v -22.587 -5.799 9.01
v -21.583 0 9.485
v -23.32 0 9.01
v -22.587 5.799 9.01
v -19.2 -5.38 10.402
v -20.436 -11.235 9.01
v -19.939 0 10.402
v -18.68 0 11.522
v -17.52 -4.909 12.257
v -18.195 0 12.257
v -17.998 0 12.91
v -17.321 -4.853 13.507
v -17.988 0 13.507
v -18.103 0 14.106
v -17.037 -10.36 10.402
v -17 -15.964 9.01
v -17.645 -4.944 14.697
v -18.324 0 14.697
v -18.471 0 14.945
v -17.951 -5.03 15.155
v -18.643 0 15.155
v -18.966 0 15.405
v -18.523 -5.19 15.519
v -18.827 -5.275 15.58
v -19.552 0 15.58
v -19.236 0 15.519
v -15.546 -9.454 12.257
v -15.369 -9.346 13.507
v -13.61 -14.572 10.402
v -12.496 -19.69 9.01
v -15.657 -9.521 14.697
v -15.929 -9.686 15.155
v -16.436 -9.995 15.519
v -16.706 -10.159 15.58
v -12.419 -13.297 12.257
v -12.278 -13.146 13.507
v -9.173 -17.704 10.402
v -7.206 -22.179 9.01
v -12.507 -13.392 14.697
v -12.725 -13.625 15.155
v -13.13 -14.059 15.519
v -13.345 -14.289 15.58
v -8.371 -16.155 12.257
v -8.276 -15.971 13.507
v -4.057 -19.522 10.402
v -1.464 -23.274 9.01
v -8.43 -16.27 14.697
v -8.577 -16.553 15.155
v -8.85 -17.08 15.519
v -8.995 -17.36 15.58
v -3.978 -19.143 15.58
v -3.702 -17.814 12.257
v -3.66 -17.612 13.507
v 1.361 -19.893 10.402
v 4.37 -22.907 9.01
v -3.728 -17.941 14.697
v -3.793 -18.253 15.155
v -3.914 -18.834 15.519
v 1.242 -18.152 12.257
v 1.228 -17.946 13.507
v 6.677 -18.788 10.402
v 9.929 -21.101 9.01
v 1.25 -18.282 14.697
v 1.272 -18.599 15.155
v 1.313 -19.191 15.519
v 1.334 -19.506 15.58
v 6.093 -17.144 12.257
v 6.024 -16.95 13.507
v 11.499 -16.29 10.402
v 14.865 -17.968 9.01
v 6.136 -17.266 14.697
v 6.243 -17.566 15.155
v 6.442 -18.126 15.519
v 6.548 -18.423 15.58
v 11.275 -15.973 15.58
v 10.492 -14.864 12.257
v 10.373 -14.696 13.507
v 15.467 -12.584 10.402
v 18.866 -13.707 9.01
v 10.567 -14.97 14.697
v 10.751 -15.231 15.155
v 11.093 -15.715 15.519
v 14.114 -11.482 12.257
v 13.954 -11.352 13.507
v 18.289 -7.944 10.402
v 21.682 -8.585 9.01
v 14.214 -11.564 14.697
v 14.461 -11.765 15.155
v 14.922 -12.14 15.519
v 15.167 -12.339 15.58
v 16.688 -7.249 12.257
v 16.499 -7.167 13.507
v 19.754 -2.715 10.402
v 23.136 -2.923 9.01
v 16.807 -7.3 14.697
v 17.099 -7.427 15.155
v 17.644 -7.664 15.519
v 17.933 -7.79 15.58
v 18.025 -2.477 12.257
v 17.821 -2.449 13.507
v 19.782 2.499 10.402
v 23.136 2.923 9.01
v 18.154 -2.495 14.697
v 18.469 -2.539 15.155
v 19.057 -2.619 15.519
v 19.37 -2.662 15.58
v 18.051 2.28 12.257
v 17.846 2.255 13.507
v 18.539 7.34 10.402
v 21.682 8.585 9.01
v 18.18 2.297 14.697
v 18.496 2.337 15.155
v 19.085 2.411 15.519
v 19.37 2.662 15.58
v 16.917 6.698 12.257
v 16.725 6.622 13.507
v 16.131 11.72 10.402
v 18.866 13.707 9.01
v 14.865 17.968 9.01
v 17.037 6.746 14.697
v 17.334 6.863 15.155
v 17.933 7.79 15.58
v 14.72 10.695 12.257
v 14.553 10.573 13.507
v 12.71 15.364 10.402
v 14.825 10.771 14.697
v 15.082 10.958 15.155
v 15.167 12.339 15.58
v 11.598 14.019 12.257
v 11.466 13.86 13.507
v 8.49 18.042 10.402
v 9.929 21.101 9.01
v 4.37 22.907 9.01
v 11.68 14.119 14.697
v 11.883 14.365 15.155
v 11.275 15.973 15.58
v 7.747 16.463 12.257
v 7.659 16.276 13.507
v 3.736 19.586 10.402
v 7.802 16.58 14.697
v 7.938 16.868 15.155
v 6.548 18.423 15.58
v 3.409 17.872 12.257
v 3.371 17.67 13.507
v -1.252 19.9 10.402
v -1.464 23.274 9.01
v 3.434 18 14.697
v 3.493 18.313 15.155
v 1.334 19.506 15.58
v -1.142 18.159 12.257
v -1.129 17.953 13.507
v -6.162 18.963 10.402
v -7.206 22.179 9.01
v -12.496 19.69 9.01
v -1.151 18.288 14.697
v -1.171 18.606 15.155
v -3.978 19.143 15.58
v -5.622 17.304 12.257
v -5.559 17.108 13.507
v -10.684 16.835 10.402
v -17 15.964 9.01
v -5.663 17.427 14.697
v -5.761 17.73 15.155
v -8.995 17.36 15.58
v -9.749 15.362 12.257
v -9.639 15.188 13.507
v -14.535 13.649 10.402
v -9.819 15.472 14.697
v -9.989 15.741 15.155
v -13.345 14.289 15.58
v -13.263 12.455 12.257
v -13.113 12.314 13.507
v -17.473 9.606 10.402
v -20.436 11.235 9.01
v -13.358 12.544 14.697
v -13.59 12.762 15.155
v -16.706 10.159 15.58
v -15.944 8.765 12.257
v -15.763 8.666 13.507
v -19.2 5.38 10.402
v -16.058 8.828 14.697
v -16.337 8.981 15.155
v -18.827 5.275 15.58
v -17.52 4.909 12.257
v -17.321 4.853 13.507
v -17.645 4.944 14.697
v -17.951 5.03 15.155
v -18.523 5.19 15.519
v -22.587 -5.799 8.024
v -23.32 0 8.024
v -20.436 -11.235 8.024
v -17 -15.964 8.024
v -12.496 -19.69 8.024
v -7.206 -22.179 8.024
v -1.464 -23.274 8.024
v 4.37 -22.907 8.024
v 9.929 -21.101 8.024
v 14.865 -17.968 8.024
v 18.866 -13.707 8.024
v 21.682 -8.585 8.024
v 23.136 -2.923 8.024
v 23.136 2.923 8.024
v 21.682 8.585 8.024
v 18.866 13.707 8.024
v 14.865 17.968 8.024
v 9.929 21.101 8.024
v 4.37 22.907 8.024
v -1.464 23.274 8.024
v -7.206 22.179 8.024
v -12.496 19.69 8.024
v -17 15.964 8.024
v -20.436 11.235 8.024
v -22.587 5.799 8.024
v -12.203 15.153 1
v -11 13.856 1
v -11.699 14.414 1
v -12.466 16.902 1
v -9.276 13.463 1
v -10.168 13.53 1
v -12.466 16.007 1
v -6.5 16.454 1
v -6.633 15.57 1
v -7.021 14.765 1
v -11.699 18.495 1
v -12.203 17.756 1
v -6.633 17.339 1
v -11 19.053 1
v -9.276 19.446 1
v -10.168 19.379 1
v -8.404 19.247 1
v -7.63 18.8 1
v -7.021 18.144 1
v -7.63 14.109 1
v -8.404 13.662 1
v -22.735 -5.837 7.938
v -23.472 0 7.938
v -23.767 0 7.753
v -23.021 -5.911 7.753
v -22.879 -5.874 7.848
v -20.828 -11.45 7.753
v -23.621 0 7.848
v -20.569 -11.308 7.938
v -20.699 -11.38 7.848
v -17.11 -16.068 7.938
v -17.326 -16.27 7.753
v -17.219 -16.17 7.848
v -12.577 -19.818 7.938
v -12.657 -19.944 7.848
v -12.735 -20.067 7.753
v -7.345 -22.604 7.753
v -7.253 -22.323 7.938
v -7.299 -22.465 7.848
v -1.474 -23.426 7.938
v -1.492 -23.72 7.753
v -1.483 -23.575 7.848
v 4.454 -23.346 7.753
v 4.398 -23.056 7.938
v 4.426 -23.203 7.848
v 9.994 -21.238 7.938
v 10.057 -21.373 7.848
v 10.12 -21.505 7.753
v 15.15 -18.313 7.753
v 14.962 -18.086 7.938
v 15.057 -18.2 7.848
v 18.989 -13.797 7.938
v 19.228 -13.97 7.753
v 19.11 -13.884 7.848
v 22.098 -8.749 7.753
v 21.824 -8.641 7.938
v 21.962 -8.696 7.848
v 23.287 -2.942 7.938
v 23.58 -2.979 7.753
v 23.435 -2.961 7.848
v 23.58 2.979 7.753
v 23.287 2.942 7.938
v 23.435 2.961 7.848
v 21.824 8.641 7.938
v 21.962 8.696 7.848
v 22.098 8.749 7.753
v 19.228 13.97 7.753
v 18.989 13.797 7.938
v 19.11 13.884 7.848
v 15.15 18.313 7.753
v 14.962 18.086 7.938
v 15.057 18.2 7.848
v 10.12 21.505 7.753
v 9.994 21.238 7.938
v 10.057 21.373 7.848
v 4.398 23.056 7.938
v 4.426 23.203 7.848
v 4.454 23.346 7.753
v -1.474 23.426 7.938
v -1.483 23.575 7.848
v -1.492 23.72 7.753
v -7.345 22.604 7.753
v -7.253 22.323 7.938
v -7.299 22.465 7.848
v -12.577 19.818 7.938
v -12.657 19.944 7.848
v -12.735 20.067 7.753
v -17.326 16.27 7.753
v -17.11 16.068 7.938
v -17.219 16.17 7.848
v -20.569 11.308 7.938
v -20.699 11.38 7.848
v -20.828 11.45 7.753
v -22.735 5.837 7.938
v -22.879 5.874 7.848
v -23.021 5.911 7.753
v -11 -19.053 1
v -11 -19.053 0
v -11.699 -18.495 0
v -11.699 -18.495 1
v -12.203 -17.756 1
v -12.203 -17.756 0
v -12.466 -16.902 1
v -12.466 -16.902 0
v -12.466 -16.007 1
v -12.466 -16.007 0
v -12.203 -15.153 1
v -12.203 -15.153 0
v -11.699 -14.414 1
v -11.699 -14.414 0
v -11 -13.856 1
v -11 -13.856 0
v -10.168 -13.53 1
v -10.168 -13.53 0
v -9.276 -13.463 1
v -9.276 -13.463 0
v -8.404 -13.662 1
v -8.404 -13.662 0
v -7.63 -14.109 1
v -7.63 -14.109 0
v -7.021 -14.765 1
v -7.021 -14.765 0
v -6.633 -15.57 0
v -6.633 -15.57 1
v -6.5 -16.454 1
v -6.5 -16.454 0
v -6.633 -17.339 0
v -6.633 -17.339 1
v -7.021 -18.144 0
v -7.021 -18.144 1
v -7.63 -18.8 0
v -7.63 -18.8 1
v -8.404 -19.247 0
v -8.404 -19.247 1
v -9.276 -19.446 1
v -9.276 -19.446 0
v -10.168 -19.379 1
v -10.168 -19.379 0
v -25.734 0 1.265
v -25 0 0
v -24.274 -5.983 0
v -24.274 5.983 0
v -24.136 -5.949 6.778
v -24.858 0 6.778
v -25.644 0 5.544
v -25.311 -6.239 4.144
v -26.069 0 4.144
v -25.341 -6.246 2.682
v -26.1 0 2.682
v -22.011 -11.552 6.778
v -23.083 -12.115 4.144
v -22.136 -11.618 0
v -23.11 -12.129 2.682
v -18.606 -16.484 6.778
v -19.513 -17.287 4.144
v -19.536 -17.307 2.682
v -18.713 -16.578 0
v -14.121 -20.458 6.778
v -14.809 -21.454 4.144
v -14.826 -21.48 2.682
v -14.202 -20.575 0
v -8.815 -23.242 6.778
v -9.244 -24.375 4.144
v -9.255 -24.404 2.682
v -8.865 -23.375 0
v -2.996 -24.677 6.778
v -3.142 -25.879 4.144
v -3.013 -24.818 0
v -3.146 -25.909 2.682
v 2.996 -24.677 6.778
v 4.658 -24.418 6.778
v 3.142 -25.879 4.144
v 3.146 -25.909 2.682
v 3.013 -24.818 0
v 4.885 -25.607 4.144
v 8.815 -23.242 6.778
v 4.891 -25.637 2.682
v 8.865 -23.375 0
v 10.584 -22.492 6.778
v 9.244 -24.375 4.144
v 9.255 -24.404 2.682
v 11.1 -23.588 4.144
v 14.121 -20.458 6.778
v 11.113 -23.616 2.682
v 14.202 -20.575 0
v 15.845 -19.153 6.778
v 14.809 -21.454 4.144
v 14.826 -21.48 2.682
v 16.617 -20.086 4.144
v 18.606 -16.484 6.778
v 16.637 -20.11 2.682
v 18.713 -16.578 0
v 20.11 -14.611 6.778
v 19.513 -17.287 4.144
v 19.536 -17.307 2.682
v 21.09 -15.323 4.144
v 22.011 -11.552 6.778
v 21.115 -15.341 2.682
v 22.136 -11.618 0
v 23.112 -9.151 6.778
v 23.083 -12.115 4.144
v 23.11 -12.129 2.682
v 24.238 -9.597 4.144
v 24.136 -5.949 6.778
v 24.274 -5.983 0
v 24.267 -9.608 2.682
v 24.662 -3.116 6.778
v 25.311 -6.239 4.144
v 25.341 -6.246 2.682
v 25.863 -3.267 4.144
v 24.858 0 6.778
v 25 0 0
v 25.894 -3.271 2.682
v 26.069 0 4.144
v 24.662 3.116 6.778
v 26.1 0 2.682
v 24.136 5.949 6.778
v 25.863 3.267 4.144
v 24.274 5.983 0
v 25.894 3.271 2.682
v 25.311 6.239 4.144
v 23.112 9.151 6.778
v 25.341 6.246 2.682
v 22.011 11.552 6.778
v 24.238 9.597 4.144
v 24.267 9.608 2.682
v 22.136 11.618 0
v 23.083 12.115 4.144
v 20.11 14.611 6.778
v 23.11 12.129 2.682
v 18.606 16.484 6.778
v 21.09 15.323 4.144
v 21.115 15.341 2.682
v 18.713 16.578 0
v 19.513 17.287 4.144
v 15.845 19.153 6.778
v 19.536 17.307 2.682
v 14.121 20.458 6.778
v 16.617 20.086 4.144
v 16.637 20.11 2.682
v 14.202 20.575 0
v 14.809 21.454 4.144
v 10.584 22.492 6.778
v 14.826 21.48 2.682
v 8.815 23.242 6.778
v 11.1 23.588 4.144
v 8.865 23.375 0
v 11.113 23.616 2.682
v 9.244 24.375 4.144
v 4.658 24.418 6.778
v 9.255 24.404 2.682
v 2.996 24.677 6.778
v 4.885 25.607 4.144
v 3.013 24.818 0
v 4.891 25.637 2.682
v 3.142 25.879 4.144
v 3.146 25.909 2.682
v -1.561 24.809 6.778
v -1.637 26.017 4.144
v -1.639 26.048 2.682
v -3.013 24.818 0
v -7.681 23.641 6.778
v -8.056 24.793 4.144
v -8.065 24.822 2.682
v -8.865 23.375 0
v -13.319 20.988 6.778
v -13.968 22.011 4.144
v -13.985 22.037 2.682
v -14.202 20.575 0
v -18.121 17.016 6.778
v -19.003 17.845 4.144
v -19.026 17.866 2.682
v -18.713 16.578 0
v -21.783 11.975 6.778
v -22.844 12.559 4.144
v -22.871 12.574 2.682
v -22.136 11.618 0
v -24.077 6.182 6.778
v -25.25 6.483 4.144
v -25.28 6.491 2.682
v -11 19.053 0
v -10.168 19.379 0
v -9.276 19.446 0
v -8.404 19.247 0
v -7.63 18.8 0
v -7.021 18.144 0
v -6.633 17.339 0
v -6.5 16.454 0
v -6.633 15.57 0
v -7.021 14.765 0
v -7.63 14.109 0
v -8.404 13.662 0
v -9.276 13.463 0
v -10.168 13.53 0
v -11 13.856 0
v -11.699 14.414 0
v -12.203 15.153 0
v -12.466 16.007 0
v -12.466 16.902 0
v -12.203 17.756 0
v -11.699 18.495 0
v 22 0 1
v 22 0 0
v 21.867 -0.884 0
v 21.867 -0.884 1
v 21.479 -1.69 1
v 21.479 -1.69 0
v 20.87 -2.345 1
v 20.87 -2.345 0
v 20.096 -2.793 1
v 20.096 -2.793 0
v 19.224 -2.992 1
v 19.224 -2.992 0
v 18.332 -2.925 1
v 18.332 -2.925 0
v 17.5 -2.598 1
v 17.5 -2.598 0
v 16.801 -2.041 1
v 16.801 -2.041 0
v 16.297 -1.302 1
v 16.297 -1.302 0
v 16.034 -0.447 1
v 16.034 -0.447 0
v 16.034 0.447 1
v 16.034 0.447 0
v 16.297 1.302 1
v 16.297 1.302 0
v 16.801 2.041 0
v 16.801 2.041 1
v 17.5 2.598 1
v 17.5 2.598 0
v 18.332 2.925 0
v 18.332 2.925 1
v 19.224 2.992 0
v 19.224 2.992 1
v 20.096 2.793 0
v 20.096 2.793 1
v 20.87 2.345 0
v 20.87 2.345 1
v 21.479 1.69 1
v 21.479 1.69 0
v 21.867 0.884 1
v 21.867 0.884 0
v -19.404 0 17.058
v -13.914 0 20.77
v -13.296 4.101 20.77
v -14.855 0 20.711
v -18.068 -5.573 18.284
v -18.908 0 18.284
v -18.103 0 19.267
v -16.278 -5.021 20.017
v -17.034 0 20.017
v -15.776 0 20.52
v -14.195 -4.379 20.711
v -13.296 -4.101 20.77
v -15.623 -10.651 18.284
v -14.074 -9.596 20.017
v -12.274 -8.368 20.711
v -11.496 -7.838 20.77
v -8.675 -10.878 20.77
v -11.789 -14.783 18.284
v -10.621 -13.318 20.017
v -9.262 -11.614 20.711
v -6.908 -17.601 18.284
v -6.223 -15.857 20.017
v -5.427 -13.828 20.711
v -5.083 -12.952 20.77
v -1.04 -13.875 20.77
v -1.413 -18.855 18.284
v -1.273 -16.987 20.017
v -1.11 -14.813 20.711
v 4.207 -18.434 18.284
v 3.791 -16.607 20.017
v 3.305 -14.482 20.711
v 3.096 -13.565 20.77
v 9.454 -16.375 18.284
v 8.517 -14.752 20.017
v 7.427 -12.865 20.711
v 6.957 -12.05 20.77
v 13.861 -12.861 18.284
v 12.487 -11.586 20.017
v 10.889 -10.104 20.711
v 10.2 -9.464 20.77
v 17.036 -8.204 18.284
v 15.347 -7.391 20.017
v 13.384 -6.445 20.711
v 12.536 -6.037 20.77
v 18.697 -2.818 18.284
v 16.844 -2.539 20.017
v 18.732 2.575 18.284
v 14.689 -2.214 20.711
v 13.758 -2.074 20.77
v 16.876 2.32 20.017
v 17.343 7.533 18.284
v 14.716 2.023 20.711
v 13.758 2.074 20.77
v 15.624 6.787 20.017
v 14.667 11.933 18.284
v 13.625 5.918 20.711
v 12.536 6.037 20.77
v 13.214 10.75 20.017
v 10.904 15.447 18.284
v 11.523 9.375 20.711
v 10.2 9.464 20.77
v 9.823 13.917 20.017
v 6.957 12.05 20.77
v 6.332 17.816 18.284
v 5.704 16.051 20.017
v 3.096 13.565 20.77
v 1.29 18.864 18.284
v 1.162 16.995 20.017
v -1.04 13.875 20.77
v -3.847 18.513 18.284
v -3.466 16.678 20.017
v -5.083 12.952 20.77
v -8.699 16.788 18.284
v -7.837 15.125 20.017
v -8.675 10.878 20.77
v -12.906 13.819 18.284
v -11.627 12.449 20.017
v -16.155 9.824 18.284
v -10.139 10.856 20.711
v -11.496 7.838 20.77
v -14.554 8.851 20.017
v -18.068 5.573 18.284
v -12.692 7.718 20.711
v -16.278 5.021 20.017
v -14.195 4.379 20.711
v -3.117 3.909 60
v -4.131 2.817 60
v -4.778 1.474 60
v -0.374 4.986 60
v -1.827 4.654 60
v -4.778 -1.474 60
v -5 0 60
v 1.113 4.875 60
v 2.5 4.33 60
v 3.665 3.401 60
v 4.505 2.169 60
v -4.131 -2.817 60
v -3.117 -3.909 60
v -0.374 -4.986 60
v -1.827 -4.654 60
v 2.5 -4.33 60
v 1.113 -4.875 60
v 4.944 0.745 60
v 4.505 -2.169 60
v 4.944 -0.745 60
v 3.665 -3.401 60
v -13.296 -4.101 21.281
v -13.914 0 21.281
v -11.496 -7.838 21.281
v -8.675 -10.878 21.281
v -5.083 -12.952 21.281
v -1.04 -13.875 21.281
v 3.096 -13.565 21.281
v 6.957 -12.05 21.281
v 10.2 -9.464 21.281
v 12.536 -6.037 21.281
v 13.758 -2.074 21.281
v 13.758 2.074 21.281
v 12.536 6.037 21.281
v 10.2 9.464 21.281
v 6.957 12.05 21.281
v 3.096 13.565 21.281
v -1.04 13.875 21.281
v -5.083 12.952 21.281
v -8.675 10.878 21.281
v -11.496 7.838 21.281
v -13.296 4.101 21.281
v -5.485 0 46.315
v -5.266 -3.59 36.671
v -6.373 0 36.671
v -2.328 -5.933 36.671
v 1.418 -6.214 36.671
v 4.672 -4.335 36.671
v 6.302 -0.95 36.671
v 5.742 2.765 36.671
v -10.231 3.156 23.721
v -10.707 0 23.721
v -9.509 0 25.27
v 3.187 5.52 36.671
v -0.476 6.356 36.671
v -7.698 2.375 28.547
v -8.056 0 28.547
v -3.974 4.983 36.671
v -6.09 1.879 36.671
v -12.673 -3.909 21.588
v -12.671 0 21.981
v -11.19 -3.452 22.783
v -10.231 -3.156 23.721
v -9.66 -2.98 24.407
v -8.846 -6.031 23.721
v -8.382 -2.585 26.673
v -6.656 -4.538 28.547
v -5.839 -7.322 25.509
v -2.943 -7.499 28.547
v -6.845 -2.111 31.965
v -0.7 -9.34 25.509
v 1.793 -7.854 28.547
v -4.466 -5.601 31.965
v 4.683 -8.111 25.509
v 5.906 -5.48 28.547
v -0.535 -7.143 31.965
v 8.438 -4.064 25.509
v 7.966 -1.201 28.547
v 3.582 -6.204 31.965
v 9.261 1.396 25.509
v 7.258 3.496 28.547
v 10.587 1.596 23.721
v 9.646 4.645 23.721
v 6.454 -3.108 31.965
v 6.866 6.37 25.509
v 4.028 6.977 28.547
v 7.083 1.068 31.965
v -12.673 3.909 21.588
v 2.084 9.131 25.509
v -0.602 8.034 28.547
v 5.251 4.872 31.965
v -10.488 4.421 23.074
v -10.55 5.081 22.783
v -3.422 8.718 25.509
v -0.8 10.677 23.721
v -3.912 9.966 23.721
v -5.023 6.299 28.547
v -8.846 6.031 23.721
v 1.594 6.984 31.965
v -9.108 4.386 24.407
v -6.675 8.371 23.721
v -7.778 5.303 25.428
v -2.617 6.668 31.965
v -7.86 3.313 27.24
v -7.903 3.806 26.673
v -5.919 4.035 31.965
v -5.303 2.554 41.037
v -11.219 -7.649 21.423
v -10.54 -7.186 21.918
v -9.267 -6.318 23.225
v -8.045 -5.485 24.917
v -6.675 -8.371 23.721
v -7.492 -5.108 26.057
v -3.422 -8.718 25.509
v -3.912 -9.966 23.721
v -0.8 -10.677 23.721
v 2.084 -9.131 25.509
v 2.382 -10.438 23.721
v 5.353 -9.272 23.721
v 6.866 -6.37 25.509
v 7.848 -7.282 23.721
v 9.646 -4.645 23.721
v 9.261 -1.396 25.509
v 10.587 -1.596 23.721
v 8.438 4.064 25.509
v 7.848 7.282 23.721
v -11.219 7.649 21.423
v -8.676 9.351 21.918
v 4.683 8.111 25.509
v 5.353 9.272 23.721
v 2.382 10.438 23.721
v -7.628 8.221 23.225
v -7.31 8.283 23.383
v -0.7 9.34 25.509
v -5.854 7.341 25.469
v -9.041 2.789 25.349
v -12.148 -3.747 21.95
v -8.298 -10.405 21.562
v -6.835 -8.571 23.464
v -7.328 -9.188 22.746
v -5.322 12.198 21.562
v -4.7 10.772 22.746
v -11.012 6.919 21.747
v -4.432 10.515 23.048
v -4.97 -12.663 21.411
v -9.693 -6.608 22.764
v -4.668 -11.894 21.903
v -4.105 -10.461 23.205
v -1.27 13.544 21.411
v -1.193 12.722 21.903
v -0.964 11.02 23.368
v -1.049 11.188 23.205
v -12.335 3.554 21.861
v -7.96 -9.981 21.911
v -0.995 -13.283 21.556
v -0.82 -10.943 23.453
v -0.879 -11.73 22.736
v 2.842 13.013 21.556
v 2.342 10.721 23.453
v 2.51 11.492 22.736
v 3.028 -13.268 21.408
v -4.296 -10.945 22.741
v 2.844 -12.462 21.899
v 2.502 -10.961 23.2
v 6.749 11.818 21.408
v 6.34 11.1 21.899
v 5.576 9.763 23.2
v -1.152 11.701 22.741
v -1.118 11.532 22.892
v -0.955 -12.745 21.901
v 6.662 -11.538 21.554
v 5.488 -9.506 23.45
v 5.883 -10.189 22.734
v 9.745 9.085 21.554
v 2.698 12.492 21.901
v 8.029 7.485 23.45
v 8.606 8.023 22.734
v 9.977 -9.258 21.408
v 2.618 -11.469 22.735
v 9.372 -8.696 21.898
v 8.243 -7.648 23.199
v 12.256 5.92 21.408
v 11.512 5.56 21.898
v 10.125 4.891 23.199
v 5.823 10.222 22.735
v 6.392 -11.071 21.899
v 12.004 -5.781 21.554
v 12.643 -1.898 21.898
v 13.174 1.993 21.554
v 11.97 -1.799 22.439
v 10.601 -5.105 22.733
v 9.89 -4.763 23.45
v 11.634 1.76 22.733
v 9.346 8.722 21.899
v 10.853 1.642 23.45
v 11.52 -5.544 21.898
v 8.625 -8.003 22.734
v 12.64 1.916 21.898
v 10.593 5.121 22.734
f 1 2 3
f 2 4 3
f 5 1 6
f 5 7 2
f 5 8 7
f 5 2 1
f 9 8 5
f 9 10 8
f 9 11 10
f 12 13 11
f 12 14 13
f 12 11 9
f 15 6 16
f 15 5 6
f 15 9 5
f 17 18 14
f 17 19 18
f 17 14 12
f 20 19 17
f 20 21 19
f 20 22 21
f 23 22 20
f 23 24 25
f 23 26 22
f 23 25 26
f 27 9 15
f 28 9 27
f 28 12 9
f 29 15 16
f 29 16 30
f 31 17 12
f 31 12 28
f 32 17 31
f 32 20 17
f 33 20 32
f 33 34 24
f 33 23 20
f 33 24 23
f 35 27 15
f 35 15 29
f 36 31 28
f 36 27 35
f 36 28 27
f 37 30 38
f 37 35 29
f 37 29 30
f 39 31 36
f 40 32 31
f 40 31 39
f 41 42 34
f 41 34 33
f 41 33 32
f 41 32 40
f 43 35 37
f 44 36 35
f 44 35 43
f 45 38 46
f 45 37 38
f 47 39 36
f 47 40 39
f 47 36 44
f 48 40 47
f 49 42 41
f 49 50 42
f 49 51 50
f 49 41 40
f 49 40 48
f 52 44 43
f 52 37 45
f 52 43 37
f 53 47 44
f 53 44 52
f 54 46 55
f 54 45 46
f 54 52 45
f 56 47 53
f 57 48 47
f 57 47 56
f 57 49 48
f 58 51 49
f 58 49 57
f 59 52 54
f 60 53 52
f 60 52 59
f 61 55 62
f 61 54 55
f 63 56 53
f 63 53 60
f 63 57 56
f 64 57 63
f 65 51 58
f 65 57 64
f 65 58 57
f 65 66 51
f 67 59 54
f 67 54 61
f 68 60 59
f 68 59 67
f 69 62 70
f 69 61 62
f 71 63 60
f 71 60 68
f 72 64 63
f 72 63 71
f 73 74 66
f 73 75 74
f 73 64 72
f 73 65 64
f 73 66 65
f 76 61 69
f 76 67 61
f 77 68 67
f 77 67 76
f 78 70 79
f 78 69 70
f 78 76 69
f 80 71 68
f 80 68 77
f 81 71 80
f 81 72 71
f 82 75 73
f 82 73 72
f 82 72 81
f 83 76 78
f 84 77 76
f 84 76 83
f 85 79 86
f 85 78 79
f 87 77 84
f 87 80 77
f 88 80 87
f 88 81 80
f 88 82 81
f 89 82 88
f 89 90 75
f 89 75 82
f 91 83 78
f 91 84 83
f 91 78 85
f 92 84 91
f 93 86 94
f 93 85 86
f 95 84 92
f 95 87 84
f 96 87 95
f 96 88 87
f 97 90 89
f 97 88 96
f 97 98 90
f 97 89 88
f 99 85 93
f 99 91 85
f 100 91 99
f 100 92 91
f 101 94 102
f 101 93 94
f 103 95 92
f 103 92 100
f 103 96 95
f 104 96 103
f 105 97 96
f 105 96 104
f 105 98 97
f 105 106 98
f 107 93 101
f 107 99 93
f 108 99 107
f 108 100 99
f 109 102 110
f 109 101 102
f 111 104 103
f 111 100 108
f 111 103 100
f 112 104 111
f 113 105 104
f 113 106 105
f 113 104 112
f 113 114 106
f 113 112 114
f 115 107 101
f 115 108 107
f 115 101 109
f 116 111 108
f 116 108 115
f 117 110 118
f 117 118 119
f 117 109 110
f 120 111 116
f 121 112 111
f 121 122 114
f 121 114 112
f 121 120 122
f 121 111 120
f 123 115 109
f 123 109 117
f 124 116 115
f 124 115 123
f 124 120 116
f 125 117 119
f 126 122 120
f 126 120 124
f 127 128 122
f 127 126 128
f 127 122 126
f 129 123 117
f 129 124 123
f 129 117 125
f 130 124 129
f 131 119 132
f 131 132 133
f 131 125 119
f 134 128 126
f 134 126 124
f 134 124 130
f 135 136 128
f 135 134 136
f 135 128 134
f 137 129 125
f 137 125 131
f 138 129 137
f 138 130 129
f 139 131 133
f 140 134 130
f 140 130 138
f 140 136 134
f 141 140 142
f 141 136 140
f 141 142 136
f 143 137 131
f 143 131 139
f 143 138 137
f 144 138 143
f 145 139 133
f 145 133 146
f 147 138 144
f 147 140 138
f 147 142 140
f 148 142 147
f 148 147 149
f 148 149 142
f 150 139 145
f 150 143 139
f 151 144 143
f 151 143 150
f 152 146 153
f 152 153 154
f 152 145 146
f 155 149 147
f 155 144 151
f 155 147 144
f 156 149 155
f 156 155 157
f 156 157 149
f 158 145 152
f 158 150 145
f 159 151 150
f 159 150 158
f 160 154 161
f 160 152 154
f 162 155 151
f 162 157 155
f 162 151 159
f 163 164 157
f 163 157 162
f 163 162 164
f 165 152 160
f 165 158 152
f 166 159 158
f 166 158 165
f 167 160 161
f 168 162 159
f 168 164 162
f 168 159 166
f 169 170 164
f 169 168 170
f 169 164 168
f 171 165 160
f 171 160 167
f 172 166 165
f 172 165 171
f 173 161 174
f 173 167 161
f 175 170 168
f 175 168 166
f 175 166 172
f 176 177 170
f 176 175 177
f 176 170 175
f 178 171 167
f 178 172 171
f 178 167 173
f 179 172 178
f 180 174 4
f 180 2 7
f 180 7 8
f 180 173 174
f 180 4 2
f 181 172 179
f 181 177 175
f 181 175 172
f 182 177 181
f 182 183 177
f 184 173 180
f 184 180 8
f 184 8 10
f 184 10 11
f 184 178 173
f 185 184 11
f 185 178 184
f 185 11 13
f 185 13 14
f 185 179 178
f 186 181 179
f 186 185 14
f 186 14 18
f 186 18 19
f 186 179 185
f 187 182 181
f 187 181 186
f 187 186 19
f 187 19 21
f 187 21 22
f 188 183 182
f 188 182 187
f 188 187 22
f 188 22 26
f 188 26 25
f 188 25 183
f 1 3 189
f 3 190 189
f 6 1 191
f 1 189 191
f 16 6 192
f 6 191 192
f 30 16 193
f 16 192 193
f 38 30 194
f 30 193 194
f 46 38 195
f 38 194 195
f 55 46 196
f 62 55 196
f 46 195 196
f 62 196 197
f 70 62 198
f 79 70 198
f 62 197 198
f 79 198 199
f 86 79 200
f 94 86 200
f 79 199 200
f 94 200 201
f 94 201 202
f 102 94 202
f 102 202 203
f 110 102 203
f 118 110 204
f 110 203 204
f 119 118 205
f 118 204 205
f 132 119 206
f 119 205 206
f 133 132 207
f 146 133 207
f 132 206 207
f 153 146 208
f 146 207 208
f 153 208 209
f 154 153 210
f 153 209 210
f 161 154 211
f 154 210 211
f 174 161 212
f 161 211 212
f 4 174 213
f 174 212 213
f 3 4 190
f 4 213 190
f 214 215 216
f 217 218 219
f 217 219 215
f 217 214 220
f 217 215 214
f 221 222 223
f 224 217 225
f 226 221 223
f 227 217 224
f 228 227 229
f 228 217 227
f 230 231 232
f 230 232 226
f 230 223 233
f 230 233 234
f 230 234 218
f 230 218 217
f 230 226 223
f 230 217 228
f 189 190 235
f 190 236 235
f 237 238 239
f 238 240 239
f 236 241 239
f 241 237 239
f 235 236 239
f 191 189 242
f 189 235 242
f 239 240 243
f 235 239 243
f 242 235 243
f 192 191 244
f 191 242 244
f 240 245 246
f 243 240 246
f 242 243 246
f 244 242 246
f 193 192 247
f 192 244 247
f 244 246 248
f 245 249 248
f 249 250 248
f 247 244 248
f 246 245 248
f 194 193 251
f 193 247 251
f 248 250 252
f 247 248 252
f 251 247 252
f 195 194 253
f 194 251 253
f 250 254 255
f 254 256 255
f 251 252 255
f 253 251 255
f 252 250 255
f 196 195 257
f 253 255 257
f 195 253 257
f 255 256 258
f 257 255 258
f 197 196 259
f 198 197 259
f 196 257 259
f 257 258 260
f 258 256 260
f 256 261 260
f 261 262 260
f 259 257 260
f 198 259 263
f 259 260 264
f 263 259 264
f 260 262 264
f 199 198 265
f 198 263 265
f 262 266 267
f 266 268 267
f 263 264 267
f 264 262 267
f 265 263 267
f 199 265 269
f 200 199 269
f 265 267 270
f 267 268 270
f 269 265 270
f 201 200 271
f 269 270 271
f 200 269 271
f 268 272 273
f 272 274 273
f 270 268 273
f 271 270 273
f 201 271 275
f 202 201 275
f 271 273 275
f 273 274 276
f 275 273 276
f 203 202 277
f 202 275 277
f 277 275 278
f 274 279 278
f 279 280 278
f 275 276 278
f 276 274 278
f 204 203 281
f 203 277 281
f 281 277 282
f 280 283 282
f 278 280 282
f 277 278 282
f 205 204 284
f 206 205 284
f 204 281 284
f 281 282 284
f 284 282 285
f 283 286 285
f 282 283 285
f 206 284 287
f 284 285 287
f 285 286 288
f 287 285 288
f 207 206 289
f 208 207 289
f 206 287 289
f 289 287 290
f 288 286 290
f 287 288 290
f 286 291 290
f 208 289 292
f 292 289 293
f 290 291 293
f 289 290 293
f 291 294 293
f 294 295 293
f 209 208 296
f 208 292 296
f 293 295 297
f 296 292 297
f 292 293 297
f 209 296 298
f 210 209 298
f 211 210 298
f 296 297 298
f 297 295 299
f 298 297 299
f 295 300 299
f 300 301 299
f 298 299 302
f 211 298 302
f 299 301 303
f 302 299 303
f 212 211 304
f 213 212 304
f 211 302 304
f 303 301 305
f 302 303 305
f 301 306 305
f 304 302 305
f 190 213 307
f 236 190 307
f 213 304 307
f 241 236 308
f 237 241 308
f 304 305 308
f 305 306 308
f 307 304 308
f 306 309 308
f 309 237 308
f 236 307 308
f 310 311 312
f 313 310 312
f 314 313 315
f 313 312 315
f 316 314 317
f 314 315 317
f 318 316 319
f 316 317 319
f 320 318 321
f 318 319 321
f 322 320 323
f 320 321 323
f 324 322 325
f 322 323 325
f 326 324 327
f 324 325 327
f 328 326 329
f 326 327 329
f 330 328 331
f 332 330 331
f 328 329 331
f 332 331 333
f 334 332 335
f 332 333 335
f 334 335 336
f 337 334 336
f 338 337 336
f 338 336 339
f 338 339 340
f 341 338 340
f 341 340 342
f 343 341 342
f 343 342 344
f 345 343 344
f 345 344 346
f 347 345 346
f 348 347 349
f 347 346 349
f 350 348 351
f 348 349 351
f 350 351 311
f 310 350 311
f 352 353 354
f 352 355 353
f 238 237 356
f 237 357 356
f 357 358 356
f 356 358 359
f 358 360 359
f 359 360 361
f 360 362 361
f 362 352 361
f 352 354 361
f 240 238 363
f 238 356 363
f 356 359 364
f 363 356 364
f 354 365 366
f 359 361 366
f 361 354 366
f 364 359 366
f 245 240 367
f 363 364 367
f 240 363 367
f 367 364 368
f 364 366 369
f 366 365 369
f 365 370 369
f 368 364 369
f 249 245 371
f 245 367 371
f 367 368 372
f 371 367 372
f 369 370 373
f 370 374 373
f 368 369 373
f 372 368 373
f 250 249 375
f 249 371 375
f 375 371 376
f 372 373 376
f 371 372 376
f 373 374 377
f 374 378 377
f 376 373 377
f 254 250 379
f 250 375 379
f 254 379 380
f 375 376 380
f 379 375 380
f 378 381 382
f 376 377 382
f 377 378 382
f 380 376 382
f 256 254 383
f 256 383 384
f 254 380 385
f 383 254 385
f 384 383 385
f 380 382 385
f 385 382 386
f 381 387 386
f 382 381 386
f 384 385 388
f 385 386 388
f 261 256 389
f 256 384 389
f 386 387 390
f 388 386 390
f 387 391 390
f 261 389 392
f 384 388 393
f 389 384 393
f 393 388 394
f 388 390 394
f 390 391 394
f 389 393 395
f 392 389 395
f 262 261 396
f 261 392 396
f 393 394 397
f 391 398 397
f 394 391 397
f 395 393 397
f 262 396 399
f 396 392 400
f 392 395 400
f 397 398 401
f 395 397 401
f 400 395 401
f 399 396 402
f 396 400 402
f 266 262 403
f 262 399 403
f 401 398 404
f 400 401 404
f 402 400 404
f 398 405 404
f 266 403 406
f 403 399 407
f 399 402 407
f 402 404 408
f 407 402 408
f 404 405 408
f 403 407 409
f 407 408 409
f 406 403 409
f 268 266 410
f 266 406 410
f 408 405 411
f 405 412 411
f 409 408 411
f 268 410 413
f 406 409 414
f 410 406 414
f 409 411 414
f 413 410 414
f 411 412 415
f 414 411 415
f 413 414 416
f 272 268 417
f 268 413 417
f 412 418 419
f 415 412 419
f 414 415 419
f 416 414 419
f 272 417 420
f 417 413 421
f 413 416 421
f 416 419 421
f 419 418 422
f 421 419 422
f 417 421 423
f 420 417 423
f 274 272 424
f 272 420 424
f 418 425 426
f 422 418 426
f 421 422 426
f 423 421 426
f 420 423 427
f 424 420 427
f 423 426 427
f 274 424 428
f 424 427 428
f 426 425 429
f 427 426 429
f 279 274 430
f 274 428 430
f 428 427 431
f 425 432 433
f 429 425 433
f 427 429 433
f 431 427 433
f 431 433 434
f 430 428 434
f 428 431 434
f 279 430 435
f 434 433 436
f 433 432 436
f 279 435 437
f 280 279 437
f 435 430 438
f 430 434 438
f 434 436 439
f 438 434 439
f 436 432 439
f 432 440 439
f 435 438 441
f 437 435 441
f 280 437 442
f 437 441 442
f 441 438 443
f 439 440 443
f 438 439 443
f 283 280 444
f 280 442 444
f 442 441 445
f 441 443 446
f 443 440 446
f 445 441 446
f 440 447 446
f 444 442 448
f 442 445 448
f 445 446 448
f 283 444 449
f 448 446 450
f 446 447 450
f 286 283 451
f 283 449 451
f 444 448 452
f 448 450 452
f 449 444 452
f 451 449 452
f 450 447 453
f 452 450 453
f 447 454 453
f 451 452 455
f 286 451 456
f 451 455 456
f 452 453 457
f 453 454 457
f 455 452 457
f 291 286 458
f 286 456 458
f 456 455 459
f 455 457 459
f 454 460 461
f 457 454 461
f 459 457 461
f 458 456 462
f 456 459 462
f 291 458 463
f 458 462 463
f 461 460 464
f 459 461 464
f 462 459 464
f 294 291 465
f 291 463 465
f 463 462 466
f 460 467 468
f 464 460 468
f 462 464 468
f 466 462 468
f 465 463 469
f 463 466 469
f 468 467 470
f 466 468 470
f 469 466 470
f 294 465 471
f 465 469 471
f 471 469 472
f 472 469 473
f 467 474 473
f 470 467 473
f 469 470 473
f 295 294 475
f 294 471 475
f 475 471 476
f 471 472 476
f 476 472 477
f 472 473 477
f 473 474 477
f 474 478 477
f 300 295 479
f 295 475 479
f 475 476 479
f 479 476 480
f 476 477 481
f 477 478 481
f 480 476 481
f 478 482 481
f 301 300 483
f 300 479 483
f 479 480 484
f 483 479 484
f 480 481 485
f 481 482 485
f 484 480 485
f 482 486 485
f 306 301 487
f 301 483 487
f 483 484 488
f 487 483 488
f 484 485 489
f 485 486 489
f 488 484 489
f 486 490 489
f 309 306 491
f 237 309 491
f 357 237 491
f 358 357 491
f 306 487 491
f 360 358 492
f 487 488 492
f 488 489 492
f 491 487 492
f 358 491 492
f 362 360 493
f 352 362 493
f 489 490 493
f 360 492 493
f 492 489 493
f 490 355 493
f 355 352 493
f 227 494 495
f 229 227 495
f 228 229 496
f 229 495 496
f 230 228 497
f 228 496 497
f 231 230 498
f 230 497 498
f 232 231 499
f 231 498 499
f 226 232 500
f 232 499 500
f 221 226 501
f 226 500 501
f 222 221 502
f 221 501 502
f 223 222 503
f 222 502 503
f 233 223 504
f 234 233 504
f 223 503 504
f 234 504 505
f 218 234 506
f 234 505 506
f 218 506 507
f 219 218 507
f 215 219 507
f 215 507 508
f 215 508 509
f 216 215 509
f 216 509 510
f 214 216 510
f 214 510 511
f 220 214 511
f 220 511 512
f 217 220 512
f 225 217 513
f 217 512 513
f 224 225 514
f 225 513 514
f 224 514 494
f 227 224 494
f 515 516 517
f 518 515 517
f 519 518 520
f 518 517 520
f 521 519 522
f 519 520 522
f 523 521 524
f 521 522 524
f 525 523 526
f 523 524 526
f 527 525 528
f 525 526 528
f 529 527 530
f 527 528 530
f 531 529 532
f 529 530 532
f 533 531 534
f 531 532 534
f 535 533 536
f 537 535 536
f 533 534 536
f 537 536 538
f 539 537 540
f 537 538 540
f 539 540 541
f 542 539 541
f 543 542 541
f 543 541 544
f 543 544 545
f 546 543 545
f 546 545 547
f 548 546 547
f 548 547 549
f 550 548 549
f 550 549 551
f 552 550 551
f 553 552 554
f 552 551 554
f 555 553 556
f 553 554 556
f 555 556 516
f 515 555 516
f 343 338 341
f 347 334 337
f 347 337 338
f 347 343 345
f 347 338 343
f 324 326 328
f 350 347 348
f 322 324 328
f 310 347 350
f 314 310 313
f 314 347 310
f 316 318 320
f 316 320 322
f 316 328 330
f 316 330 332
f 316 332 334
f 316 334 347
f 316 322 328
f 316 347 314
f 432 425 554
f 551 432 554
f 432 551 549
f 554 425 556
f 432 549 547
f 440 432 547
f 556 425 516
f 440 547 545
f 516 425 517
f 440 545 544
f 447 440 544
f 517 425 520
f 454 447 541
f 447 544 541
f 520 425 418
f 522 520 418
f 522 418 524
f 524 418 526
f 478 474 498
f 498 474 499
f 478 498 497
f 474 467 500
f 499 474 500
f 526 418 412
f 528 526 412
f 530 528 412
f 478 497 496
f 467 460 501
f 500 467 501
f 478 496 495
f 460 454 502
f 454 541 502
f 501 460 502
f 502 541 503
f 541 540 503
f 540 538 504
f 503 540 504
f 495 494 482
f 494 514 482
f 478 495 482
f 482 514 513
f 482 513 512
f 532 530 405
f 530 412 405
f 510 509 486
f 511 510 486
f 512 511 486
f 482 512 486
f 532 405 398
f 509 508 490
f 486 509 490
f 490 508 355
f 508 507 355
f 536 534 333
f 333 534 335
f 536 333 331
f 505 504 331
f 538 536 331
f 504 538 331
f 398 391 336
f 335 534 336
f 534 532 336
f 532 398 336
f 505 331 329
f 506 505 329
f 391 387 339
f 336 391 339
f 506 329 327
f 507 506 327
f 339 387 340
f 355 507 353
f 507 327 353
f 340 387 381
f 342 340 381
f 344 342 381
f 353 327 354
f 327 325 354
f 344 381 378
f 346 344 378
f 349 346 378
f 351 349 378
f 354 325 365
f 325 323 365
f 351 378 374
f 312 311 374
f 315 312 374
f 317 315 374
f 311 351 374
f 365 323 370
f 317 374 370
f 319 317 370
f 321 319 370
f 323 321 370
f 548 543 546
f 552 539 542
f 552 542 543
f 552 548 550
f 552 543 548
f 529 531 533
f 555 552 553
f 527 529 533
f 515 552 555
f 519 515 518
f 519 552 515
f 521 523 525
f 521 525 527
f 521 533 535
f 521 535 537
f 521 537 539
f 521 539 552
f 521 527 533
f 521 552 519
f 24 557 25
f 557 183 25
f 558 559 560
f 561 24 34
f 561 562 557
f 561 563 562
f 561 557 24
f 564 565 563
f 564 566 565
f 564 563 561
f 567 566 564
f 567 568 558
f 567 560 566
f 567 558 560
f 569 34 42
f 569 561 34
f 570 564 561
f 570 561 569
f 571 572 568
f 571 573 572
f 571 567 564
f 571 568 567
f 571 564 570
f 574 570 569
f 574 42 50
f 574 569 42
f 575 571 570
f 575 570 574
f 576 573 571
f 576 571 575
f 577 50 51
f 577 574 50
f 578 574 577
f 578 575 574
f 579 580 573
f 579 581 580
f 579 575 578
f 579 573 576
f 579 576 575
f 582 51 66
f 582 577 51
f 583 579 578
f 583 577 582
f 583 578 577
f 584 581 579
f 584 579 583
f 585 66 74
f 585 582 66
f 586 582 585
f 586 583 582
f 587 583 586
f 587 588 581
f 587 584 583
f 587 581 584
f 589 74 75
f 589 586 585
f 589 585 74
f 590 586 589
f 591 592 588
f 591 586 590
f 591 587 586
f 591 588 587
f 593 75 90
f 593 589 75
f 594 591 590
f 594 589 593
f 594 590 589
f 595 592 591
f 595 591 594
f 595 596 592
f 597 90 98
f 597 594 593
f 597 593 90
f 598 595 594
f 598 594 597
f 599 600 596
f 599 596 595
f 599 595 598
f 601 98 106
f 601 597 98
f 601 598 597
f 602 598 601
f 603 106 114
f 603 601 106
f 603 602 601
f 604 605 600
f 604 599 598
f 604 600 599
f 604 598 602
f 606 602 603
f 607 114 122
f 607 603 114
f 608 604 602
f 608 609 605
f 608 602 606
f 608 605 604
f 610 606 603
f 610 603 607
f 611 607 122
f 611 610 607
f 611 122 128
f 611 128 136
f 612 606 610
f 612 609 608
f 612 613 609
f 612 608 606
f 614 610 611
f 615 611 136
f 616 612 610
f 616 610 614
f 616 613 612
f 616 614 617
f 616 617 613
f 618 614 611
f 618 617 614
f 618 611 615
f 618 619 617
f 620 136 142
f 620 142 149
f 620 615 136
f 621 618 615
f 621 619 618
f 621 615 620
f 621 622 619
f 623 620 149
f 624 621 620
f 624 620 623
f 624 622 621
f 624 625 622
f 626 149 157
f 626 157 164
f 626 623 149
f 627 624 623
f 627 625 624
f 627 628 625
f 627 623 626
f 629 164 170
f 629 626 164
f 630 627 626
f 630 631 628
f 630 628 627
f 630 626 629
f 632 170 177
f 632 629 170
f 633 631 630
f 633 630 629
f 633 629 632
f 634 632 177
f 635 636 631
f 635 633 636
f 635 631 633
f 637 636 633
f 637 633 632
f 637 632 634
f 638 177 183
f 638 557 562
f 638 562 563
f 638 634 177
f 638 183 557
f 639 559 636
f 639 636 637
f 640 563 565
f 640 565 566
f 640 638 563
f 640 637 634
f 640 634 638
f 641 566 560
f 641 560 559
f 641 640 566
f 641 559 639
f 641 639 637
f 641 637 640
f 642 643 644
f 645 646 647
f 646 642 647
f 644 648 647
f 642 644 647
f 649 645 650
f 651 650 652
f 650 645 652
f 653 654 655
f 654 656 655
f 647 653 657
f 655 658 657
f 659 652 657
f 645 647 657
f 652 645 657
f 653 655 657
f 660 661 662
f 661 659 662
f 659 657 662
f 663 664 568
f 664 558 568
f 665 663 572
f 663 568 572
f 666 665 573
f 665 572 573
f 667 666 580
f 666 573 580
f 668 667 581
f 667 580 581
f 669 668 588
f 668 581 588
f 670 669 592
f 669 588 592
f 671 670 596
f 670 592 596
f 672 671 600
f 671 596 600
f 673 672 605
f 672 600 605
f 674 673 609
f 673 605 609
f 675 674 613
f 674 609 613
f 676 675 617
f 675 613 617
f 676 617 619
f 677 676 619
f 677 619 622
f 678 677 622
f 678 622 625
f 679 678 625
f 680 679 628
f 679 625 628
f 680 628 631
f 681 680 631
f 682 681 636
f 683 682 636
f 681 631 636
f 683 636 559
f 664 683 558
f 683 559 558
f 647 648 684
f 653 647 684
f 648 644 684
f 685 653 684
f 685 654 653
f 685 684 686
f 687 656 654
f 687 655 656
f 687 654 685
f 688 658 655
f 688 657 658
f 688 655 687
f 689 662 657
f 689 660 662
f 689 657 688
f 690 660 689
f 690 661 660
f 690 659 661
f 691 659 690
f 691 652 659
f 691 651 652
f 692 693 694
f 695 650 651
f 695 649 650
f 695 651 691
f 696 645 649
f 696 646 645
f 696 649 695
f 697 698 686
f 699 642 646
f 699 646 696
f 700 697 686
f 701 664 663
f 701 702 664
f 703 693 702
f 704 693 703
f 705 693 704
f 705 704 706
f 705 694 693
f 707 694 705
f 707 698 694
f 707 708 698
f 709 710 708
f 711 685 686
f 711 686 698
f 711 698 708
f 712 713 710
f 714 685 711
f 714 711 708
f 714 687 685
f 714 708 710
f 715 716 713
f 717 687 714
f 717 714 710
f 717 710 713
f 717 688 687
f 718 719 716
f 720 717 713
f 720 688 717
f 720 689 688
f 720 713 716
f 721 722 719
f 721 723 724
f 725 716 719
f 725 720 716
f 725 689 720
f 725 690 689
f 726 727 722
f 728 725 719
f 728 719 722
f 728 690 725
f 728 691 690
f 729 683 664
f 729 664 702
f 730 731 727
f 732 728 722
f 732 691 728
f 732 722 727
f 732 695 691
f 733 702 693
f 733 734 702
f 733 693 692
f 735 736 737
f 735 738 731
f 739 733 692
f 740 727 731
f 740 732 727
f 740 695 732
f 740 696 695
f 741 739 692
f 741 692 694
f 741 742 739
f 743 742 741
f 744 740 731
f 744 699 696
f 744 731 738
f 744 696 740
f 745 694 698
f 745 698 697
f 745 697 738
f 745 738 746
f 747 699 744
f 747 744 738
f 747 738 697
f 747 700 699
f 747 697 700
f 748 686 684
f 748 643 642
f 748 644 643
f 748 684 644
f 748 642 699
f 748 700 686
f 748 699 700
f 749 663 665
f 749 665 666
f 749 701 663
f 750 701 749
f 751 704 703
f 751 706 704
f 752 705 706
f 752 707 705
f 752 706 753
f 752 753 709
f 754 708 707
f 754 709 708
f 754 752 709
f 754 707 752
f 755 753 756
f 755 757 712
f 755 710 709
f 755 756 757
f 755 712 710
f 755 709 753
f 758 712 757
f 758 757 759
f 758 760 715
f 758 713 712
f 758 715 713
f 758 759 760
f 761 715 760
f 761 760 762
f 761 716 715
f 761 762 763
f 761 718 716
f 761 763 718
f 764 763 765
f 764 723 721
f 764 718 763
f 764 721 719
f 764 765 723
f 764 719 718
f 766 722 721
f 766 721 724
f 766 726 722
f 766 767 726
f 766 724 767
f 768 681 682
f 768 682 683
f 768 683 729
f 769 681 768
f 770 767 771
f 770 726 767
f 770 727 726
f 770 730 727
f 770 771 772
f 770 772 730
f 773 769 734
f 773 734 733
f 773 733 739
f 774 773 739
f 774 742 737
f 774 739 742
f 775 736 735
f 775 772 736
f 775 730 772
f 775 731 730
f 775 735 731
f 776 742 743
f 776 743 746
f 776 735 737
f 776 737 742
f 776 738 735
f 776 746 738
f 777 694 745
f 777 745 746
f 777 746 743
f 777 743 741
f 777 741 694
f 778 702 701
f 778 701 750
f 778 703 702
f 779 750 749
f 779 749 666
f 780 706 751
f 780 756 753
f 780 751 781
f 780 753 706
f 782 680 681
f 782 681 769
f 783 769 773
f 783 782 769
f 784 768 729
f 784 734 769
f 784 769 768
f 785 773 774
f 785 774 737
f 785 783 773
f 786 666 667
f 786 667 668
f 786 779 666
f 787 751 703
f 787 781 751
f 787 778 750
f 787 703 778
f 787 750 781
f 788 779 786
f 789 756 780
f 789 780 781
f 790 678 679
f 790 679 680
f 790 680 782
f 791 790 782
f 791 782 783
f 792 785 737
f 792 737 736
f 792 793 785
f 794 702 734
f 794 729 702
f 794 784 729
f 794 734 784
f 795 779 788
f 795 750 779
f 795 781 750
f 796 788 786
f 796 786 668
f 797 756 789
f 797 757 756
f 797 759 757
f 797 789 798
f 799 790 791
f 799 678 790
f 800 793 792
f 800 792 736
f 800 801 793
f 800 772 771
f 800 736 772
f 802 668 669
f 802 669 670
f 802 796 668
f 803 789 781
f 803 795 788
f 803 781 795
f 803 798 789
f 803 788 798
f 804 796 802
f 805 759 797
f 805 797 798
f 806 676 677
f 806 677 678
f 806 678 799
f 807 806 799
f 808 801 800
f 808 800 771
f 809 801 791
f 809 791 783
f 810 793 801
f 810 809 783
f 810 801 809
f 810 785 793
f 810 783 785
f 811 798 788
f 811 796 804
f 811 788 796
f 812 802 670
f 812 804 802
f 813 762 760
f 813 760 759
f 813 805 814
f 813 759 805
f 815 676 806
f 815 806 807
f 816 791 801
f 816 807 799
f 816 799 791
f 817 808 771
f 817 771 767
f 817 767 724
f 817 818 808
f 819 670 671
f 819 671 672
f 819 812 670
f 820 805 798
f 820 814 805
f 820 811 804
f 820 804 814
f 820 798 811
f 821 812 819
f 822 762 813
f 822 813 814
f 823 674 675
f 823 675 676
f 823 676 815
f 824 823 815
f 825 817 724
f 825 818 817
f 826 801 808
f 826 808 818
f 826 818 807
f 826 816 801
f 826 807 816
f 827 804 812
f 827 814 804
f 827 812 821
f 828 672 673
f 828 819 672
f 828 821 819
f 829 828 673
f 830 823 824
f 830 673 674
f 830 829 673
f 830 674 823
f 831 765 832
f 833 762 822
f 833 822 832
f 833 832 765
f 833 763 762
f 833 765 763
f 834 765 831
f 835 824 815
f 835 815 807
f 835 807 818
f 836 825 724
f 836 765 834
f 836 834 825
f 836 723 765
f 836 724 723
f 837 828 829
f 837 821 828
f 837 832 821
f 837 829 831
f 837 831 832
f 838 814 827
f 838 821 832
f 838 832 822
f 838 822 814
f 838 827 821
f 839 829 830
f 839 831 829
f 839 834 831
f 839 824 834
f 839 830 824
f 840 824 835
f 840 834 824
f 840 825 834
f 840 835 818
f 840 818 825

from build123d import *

# Parameters (mm, degrees)
F2_R            = 3
F3_DEPTH        = 1
F3_COPIES_COUNT = 3


# Not quite as in the source:
# - a pattern or mirror of a feature is missing from the dataset's text; its kind, count and spacing are read off the source's solid


with BuildPart() as f1:
    # F0 (on Front) → F1 (revolve)
    with BuildSketch(Plane.XZ):
        with BuildLine():
            ThreePointArc((0, 25), (-7.2712870514, 23.9192053509), (-13.9138726518, 20.7702707693))
            ThreePointArc((-13.9138726518, 20.7702707693), (-16.9329926398, 18.3922201015), (-19.5519464432, 15.5795182943))
            add(Edge.make_bspline(
                [(-23.3200709548, 9.0096776116), (-21.486513797, 9.2002640085), (-17.9330601868, 11.4727622575), (-17.882184425, 13.9799116864), (-18.6395279182, 15.496779924), (-19.5519464432, 15.5795182943)],
                knots=[0, 0, 0, 0, 0.4447205998, 0.7258165522, 1, 1, 1, 1], degree=3))
            Line((-23.3200709548, 9.0096776116), (-23.3200709548, 8.023869816))
            ThreePointArc((-23.3200709548, 8.023869816), (-18.0187025434, 7.9122934085), (-15.399707997, 3.3016726375))
            ThreePointArc((-15.399707997, 3.3016726375), (-15.6915120532, 1.5559363089), (-16.5351986885, 0))
            Line((-16.5351986885, 0), (0, 0))
            Line((0, 0), (0, 25))
        make_face()
        with BuildLine():
            Line((-13.9138726518, 21.280977875), (-13.9138726518, 20.7702707693))
            ThreePointArc((-13.9138726518, 20.7702707693), (-7.2712870514, 23.9192053509), (0, 25))
            Line((0, 25), (0, 60))
            Line((0, 60), (-5, 60))
            add(Edge.make_bspline(
                [(-13.9138726518, 21.280977875), (-13.0526568698, 21.6014376217), (-9.9668374865, 24.3144288022), (-5.488730967, 28.2790772617), (-5, 60)],
                knots=[0, 0, 0, 0, 0.2106788088, 1, 1, 1, 1], degree=3))
        make_face()
        with BuildLine():
            ThreePointArc((-19.5519464432, 15.5795182943), (-16.9329926398, 18.3922201015), (-13.9138726518, 20.7702707693))
            add(Edge.make_bspline(
                [(-19.5519464432, 15.5795182943), (-19.5931974036, 17.273765886), (-18.3786831103, 19.8004802455), (-15.3900210334, 20.7829197498), (-13.9138726518, 20.7702707693)],
                knots=[0, 0, 0, 0, 0.4965371483, 1, 1, 1, 1], degree=3))
        make_face()
        with BuildLine():
            ThreePointArc((-23.3200709548, 8.023869816), (-23.5470299297, 7.8939512806), (-23.7673920649, 7.753133201))
            ThreePointArc((-23.7673920649, 7.753133201), (-24.6899250872, 3.9252514809), (-25, 0))
            Line((-25, 0), (-16.5351986885, 0))
            ThreePointArc((-16.5351986885, 0), (-15.6915120532, 1.5559363089), (-15.399707997, 3.3016726375))
            ThreePointArc((-15.399707997, 3.3016726375), (-18.0187025434, 7.9122934085), (-23.3200709548, 8.023869816))
        make_face()
        with BuildLine():
            ThreePointArc((-25, 0), (-24.6899250872, 3.9252514809), (-23.7673920649, 7.753133201))
            ThreePointArc((-23.7673920649, 7.753133201), (-26.0689127538, 4.1444855759), (-25, 0))
        make_face()
    revolve(axis=Axis((0, 0, 30), (0, 0, 1)))

    # F2 (on face) → F3 (cut)
    with BuildSketch(Plane(origin=(0, 0, 0), x_dir=(1, 0, 0), z_dir=(0, 0, -1))):
        with Locations((19, 0)):
            Circle(F2_R)
    f3 = extrude(amount=-F3_DEPTH, mode=Mode.SUBTRACT)

    # F3_copies: F3 ×3 about axis
    f3_copies_axis = Axis((0, 0, 0), (0, 0, 1))
    for i in range(1, F3_COPIES_COUNT):
        add(f3.rotate(f3_copies_axis, i * 360 / F3_COPIES_COUNT), mode=Mode.SUBTRACT)


solid = f1.part
